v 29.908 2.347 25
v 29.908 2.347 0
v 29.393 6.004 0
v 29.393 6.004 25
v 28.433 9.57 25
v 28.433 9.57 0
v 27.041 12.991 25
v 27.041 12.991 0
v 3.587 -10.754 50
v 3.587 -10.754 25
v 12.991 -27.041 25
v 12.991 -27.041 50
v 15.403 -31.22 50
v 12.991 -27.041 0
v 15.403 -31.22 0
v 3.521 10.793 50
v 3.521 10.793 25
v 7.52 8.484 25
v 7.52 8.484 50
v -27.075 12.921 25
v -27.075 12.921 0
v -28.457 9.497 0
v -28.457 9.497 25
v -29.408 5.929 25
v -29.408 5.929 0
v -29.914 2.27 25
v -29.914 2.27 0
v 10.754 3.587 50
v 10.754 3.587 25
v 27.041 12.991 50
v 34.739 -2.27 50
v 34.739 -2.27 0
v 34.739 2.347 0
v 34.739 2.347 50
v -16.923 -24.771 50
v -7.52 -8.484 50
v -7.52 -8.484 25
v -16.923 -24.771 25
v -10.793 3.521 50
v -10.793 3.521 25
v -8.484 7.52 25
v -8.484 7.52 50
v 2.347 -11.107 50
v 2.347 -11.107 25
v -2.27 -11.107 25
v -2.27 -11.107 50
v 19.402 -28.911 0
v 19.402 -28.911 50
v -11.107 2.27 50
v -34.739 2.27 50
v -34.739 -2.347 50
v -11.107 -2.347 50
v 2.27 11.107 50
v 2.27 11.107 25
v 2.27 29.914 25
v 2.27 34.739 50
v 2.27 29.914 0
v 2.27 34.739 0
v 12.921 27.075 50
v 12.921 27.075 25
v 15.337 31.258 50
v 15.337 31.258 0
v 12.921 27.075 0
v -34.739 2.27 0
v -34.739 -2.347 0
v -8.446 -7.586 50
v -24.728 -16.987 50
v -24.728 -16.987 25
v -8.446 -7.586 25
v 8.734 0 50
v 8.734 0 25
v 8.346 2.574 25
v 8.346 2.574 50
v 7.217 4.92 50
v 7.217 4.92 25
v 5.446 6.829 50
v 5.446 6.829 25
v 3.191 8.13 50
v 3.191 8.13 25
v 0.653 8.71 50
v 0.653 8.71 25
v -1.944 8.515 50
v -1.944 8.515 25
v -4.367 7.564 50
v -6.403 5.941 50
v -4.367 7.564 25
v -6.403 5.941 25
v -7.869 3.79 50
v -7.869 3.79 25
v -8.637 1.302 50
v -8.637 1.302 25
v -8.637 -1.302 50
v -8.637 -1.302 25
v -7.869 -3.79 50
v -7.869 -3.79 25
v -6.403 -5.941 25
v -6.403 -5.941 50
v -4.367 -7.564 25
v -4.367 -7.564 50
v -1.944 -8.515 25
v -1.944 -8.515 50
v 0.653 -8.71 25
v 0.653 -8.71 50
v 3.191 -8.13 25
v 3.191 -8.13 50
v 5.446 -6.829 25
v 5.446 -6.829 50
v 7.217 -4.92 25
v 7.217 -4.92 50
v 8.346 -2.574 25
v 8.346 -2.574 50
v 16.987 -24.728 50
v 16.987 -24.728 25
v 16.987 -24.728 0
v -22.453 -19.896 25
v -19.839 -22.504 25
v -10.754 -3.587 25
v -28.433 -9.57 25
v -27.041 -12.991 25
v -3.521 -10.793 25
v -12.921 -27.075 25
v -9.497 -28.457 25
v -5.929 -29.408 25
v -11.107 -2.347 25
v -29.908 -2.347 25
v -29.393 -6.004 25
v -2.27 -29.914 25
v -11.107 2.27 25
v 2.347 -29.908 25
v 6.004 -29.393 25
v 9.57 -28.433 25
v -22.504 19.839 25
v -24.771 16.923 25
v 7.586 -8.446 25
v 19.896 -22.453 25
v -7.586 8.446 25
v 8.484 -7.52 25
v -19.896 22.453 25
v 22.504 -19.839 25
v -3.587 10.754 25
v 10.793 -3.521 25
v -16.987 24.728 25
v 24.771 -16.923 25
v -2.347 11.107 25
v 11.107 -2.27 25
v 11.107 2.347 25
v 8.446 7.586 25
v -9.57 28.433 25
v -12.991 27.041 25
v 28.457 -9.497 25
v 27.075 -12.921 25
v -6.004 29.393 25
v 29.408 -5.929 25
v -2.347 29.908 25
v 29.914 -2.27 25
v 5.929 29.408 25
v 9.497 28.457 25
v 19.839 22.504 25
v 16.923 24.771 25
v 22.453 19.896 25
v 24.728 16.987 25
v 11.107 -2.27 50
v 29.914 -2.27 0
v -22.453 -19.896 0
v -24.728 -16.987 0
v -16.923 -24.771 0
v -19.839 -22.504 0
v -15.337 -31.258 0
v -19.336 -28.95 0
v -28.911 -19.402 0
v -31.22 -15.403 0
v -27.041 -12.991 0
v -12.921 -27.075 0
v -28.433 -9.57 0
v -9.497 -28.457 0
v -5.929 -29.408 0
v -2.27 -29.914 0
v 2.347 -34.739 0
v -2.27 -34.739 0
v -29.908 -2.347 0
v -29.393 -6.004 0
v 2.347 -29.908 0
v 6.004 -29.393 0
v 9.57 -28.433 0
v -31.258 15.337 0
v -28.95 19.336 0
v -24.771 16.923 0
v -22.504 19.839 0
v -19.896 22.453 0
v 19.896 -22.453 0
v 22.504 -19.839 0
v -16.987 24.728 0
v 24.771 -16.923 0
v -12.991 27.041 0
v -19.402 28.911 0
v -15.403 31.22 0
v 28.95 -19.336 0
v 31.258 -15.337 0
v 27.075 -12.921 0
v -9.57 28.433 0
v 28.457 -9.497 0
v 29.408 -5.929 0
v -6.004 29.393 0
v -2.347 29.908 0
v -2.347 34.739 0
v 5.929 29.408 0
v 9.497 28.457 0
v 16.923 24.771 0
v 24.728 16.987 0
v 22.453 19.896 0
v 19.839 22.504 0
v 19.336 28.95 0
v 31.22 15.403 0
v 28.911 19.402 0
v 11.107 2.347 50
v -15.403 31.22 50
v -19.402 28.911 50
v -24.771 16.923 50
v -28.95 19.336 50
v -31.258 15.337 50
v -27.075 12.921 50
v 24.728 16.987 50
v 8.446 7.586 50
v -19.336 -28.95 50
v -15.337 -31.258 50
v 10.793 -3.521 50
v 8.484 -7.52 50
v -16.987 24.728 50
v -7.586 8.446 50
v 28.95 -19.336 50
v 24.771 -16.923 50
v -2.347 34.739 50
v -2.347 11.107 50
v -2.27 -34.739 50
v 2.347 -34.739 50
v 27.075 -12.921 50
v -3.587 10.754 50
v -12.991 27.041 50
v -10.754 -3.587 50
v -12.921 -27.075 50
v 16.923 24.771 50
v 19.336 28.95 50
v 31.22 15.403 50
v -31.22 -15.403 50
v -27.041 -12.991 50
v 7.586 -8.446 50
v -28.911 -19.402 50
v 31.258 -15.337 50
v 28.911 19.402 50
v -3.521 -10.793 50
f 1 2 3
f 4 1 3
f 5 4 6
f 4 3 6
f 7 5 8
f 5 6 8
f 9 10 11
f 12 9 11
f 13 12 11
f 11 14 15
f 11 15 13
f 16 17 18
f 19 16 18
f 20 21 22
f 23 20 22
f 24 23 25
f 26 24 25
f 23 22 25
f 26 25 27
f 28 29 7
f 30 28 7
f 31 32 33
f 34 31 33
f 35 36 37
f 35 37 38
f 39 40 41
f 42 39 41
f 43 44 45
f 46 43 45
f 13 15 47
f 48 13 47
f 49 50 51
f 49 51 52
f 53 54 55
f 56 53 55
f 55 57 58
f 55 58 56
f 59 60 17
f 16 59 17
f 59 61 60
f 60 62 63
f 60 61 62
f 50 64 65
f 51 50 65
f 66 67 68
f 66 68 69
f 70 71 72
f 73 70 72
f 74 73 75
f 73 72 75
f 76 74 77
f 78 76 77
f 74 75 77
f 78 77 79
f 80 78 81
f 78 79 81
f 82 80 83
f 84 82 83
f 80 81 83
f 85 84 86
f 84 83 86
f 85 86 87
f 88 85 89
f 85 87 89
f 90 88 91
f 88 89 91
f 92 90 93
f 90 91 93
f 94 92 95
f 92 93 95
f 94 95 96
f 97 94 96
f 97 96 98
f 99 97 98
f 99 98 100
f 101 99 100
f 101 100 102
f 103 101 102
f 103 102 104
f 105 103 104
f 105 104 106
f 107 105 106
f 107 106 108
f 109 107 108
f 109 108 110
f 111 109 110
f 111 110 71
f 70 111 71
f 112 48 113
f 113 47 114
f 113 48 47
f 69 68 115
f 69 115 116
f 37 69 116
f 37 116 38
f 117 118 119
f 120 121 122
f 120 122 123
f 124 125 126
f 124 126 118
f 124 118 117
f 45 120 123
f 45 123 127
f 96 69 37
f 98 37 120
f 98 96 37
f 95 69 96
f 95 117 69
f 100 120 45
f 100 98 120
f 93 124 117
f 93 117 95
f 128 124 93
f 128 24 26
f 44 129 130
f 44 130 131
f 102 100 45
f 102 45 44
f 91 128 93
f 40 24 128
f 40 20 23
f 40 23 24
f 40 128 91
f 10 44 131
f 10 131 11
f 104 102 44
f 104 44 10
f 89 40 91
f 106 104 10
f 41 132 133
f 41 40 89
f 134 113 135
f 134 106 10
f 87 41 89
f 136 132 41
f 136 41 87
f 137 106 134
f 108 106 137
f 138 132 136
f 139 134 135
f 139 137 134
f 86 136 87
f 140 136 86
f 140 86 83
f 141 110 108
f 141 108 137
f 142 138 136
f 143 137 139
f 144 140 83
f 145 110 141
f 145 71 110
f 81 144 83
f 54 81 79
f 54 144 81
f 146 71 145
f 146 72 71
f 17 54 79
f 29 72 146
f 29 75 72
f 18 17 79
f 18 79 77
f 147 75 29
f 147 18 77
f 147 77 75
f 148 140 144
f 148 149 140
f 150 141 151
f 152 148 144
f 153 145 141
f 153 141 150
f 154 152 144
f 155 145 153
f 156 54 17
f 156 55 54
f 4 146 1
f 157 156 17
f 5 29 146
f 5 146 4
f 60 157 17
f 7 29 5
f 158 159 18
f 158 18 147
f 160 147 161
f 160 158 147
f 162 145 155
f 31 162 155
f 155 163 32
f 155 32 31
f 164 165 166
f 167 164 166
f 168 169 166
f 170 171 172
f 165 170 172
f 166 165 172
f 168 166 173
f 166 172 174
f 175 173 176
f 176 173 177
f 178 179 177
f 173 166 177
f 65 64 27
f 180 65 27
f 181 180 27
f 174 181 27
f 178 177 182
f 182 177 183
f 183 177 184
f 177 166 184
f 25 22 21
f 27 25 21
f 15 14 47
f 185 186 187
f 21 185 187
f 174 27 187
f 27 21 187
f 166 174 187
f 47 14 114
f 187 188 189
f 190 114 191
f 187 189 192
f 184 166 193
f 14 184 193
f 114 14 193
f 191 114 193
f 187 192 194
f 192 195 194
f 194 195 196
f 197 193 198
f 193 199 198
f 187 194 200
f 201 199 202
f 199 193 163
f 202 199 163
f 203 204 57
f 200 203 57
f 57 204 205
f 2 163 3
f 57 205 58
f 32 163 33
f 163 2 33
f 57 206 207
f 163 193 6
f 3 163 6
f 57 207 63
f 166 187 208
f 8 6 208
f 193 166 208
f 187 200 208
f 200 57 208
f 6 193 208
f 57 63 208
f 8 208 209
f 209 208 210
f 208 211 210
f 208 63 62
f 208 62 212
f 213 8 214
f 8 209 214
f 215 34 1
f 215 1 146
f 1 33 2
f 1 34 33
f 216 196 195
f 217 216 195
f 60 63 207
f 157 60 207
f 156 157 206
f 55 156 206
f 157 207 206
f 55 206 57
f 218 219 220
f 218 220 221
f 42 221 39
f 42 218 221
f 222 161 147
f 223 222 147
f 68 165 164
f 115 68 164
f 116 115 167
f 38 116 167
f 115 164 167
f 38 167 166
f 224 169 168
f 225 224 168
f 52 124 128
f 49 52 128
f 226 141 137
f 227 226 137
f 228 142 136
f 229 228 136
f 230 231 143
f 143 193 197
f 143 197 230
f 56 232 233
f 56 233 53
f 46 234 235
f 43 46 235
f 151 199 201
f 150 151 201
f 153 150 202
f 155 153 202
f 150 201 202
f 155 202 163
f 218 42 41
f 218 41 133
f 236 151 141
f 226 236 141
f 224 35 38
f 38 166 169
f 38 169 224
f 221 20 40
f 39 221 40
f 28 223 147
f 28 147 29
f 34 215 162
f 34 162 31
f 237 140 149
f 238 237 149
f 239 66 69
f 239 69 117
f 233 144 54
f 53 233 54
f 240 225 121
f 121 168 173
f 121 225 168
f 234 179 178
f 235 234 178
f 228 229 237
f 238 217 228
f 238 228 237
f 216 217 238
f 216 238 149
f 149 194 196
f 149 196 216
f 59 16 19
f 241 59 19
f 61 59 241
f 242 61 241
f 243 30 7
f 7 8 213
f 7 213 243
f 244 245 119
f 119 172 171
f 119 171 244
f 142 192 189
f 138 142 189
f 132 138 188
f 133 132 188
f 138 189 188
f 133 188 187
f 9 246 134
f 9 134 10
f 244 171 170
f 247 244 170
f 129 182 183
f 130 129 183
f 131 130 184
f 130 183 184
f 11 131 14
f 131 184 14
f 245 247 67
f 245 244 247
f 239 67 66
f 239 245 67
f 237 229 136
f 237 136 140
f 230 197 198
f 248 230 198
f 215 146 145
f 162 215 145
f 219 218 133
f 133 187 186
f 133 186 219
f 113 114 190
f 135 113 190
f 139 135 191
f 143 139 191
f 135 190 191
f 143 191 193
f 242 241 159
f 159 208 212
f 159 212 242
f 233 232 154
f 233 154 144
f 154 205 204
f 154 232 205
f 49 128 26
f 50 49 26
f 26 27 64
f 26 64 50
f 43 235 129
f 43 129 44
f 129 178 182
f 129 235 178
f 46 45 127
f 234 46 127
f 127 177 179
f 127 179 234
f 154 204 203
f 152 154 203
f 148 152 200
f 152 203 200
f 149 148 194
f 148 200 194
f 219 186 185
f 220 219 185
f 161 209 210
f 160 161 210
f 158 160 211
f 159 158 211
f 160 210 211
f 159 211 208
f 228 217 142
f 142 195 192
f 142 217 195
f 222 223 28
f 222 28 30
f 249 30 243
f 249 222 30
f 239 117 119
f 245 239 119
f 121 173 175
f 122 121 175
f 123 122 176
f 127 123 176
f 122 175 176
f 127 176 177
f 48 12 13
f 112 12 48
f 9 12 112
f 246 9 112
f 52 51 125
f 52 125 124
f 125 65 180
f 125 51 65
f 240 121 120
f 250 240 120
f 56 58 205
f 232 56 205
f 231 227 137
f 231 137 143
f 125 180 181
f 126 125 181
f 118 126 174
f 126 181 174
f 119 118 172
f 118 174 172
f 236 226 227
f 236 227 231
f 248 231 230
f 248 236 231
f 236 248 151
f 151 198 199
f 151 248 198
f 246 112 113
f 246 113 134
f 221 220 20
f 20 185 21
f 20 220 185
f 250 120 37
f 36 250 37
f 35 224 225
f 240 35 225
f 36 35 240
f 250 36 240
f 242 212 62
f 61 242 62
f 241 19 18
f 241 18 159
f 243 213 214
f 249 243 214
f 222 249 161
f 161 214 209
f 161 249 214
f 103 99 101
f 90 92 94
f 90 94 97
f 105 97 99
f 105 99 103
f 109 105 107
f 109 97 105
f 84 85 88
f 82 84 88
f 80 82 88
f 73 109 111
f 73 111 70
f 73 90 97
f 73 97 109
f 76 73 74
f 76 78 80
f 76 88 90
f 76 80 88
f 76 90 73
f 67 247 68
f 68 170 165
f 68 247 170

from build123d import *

# Parameters (mm, degrees)
F0_R     = 8.734171
F1_DEPTH = 25
F2_DEPTH = 50


with BuildPart() as f1:
    # F0 (on Top) → F1 (new body)
    with BuildSketch(Plane.XY):
        with BuildLine():
            Line((11.107184, 2.346986), (29.908053, 2.346986))
            ThreePointArc((29.908053, 2.346986), (28.967814, 7.801649), (27.041466, 12.990731))
            Line((27.041466, 12.990731), (10.754318, 3.587342))
            Line((10.754318, 3.587342), (8.44561, 7.586142))
            Line((8.44561, 7.586142), (24.727641, 16.986576))
            ThreePointArc((24.727641, 16.986576), (21.186039, 21.240333), (16.923231, 24.771036))
            Line((16.923231, 24.771036), (7.519842, 8.483889))
            Line((7.519842, 8.483889), (3.521042, 10.792597))
            Line((3.521042, 10.792597), (12.921477, 27.074627))
            ThreePointArc((12.921477, 27.074627), (7.727481, 28.987688), (2.27043, 29.913962))
            Line((2.27043, 29.913962), (2.27043, 11.107184))
            Line((2.27043, 11.107184), (-2.346986, 11.107184))
            Line((-2.346986, 11.107184), (-2.346986, 29.908053))
            ThreePointArc((-2.346986, 29.908053), (-7.801649, 28.967814), (-12.990731, 27.041466))
            Line((-12.990731, 27.041466), (-3.587342, 10.754318))
            Line((-3.587342, 10.754318), (-7.586142, 8.44561))
            Line((-7.586142, 8.44561), (-16.986576, 24.727641))
            ThreePointArc((-16.986576, 24.727641), (-21.240333, 21.186039), (-24.771036, 16.923231))
            Line((-24.771036, 16.923231), (-8.483889, 7.519842))
            Line((-8.483889, 7.519842), (-10.792597, 3.521042))
            Line((-10.792597, 3.521042), (-27.074627, 12.921477))
            ThreePointArc((-27.074627, 12.921477), (-28.987688, 7.727481), (-29.913962, 2.27043))
            Line((-29.913962, 2.27043), (-11.107184, 2.27043))
            Line((-11.107184, 2.27043), (-11.107184, -2.346986))
            Line((-11.107184, -2.346986), (-29.908053, -2.346986))
            ThreePointArc((-29.908053, -2.346986), (-28.967814, -7.801649), (-27.041466, -12.990731))
            Line((-27.041466, -12.990731), (-10.754318, -3.587342))
            Line((-10.754318, -3.587342), (-8.44561, -7.586142))
            Line((-8.44561, -7.586142), (-24.727641, -16.986576))
            ThreePointArc((-24.727641, -16.986576), (-21.186039, -21.240333), (-16.923231, -24.771036))
            Line((-16.923231, -24.771036), (-7.519842, -8.483889))
            Line((-7.519842, -8.483889), (-3.521042, -10.792597))
            Line((-3.521042, -10.792597), (-12.921477, -27.074627))
            ThreePointArc((-12.921477, -27.074627), (-7.727481, -28.987688), (-2.27043, -29.913962))
            Line((-2.27043, -29.913962), (-2.27043, -11.107184))
            Line((-2.27043, -11.107184), (2.346986, -11.107184))
            Line((2.346986, -11.107184), (2.346986, -29.908053))
            ThreePointArc((2.346986, -29.908053), (7.801649, -28.967814), (12.990731, -27.041466))
            Line((12.990731, -27.041466), (3.587342, -10.754318))
            Line((3.587342, -10.754318), (7.586142, -8.44561))
            Line((7.586142, -8.44561), (16.986576, -24.727641))
            ThreePointArc((16.986576, -24.727641), (21.240333, -21.186039), (24.771036, -16.923231))
            Line((24.771036, -16.923231), (8.483889, -7.519842))
            Line((8.483889, -7.519842), (10.792597, -3.521042))
            Line((10.792597, -3.521042), (27.074627, -12.921477))
            ThreePointArc((27.074627, -12.921477), (28.987688, -7.727481), (29.913962, -2.27043))
            Line((29.913962, -2.27043), (11.107184, -2.27043))
            Line((11.107184, -2.27043), (11.107184, 2.346986))
        make_face()
        Circle(F0_R, mode=Mode.SUBTRACT)
    extrude(amount=F1_DEPTH)

    # F0 (on Top) → F2 (join)
    with BuildSketch(Plane.XY):
        with BuildLine():
            ThreePointArc((-27.074627, 12.921477), (-25.999937, 14.966739), (-24.771036, 16.923231))
            Line((-24.771036, 16.923231), (-28.949671, 19.335767))
            Line((-28.949671, 19.335767), (-31.258379, 15.336967))
            Line((-31.258379, 15.336967), (-27.074627, 12.921477))
        make_face()
        with BuildLine():
            ThreePointArc((-16.986576, 24.727641), (-15.033236, 25.961545), (-12.990731, 27.041466))
            Line((-12.990731, 27.041466), (-15.403267, 31.220101))
            Line((-15.403267, 31.220101), (-19.402067, 28.911393))
            Line((-19.402067, 28.911393), (-16.986576, 24.727641))
        make_face()
        with BuildLine():
            ThreePointArc((-2.346986, 29.908053), (-0.038392, 29.999975), (2.27043, 29.913962))
            Line((2.27043, 29.913962), (2.27043, 34.739034))
            Line((2.27043, 34.739034), (-2.346986, 34.739034))
            Line((-2.346986, 34.739034), (-2.346986, 29.908053))
        make_face()
        with BuildLine():
            ThreePointArc((12.921477, 27.074627), (14.966739, 25.999937), (16.923231, 24.771036))
            Line((16.923231, 24.771036), (19.335767, 28.949671))
            Line((19.335767, 28.949671), (15.336967, 31.258379))
            Line((15.336967, 31.258379), (12.921477, 27.074627))
        make_face()
        with BuildLine():
            ThreePointArc((24.727641, 16.986576), (25.961545, 15.033236), (27.041466, 12.990731))
            Line((27.041466, 12.990731), (31.220101, 15.403267))
            Line((31.220101, 15.403267), (28.911393, 19.402067))
            Line((28.911393, 19.402067), (24.727641, 16.986576))
        make_face()
        with BuildLine():
            ThreePointArc((29.908053, 2.346986), (29.977005, 1.174393), (30, 0))
            ThreePointArc((30, 0), (29.978483, -1.13603), (29.913962, -2.27043))
            Line((29.913962, -2.27043), (34.739034, -2.27043))
            Line((34.739034, -2.27043), (34.739034, 2.346986))
            Line((34.739034, 2.346986), (29.908053, 2.346986))
        make_face()
        with BuildLine():
            Line((31.258379, -15.336967), (27.074627, -12.921477))
            ThreePointArc((27.074627, -12.921477), (25.999937, -14.966739), (24.771036, -16.923231))
            Line((24.771036, -16.923231), (28.949671, -19.335767))
            Line((28.949671, -19.335767), (31.258379, -15.336967))
        make_face()
        with BuildLine():
            Line((19.402067, -28.911393), (16.986576, -24.727641))
            ThreePointArc((16.986576, -24.727641), (15.033236, -25.961545), (12.990731, -27.041466))
            Line((12.990731, -27.041466), (15.403267, -31.220101))
            Line((15.403267, -31.220101), (19.402067, -28.911393))
        make_face()
        with BuildLine():
            ThreePointArc((12.990731, -27.041466), (15.033236, -25.961545), (16.986576, -24.727641))
            Line((16.986576, -24.727641), (7.586142, -8.44561))
            Line((7.586142, -8.44561), (3.587342, -10.754318))
            Line((3.587342, -10.754318), (12.990731, -27.041466))
        make_face()
        with BuildLine():
            ThreePointArc((24.771036, -16.923231), (25.999937, -14.966739), (27.074627, -12.921477))
            Line((27.074627, -12.921477), (10.792597, -3.521042))
            Line((10.792597, -3.521042), (8.483889, -7.519842))
            Line((8.483889, -7.519842), (24.771036, -16.923231))
        make_face()
        with BuildLine():
            ThreePointArc((29.913962, -2.27043), (29.978483, -1.13603), (30, 0))
            ThreePointArc((30, 0), (29.977005, 1.174393), (29.908053, 2.346986))
            Line((29.908053, 2.346986), (11.107184, 2.346986))
            Line((11.107184, 2.346986), (11.107184, -2.27043))
            Line((11.107184, -2.27043), (29.913962, -2.27043))
        make_face()
        with BuildLine():
            Line((10.754318, 3.587342), (27.041466, 12.990731))
            ThreePointArc((27.041466, 12.990731), (25.961545, 15.033236), (24.727641, 16.986576))
            Line((24.727641, 16.986576), (8.44561, 7.586142))
            Line((8.44561, 7.586142), (10.754318, 3.587342))
        make_face()
        with BuildLine():
            Line((7.519842, 8.483889), (16.923231, 24.771036))
            ThreePointArc((16.923231, 24.771036), (14.966739, 25.999937), (12.921477, 27.074627))
            Line((12.921477, 27.074627), (3.521042, 10.792597))
            Line((3.521042, 10.792597), (7.519842, 8.483889))
        make_face()
        with BuildLine():
            Line((2.27043, 11.107184), (2.27043, 29.913962))
            ThreePointArc((2.27043, 29.913962), (-0.038392, 29.999975), (-2.346986, 29.908053))
            Line((-2.346986, 29.908053), (-2.346986, 11.107184))
            Line((-2.346986, 11.107184), (2.27043, 11.107184))
        make_face()
        with BuildLine():
            Line((-3.587342, 10.754318), (-12.990731, 27.041466))
            ThreePointArc((-12.990731, 27.041466), (-15.033236, 25.961545), (-16.986576, 24.727641))
            Line((-16.986576, 24.727641), (-7.586142, 8.44561))
            Line((-7.586142, 8.44561), (-3.587342, 10.754318))
        make_face()
        with BuildLine():
            Line((-8.483889, 7.519842), (-24.771036, 16.923231))
            ThreePointArc((-24.771036, 16.923231), (-25.999937, 14.966739), (-27.074627, 12.921477))
            Line((-27.074627, 12.921477), (-10.792597, 3.521042))
            Line((-10.792597, 3.521042), (-8.483889, 7.519842))
        make_face()
        with BuildLine():
            ThreePointArc((-29.908053, -2.346986), (-29.999975, -0.038392), (-29.913962, 2.27043))
            Line((-29.913962, 2.27043), (-34.739034, 2.27043))
            Line((-34.739034, 2.27043), (-34.739034, -2.346986))
            Line((-34.739034, -2.346986), (-29.908053, -2.346986))
        make_face()
        with BuildLine():
            Line((-28.911393, -19.402067), (-24.727641, -16.986576))
            ThreePointArc((-24.727641, -16.986576), (-25.961545, -15.033236), (-27.041466, -12.990731))
            Line((-27.041466, -12.990731), (-31.220101, -15.403267))
            Line((-31.220101, -15.403267), (-28.911393, -19.402067))
        make_face()
        with BuildLine():
            ThreePointArc((-27.041466, -12.990731), (-25.961545, -15.033236), (-24.727641, -16.986576))
            Line((-24.727641, -16.986576), (-8.44561, -7.586142))
            Line((-8.44561, -7.586142), (-10.754318, -3.587342))
            Line((-10.754318, -3.587342), (-27.041466, -12.990731))
        make_face()
        with BuildLine():
            ThreePointArc((-16.923231, -24.771036), (-14.966739, -25.999937), (-12.921477, -27.074627))
            Line((-12.921477, -27.074627), (-3.521042, -10.792597))
            Line((-3.521042, -10.792597), (-7.519842, -8.483889))
            Line((-7.519842, -8.483889), (-16.923231, -24.771036))
        make_face()
        with BuildLine():
            Line((-15.336967, -31.258379), (-12.921477, -27.074627))
            ThreePointArc((-12.921477, -27.074627), (-14.966739, -25.999937), (-16.923231, -24.771036))
            Line((-16.923231, -24.771036), (-19.335767, -28.949671))
            Line((-19.335767, -28.949671), (-15.336967, -31.258379))
        make_face()
        with BuildLine():
            ThreePointArc((-2.27043, -29.913962), (0.038392, -29.999975), (2.346986, -29.908053))
            Line((2.346986, -29.908053), (2.346986, -11.107184))
            Line((2.346986, -11.107184), (-2.27043, -11.107184))
            Line((-2.27043, -11.107184), (-2.27043, -29.913962))
        make_face()
        with BuildLine():
            Line((2.346986, -34.739034), (2.346986, -29.908053))
            ThreePointArc((2.346986, -29.908053), (0.038392, -29.999975), (-2.27043, -29.913962))
            Line((-2.27043, -29.913962), (-2.27043, -34.739034))
            Line((-2.27043, -34.739034), (2.346986, -34.739034))
        make_face()
        Circle(F0_R)
        with BuildLine():
            Line((-11.107184, 2.27043), (-29.913962, 2.27043))
            ThreePointArc((-29.913962, 2.27043), (-29.999975, -0.038392), (-29.908053, -2.346986))
            Line((-29.908053, -2.346986), (-11.107184, -2.346986))
            Line((-11.107184, -2.346986), (-11.107184, 2.27043))
        make_face()
    extrude(amount=F2_DEPTH)


solid = f1.part
